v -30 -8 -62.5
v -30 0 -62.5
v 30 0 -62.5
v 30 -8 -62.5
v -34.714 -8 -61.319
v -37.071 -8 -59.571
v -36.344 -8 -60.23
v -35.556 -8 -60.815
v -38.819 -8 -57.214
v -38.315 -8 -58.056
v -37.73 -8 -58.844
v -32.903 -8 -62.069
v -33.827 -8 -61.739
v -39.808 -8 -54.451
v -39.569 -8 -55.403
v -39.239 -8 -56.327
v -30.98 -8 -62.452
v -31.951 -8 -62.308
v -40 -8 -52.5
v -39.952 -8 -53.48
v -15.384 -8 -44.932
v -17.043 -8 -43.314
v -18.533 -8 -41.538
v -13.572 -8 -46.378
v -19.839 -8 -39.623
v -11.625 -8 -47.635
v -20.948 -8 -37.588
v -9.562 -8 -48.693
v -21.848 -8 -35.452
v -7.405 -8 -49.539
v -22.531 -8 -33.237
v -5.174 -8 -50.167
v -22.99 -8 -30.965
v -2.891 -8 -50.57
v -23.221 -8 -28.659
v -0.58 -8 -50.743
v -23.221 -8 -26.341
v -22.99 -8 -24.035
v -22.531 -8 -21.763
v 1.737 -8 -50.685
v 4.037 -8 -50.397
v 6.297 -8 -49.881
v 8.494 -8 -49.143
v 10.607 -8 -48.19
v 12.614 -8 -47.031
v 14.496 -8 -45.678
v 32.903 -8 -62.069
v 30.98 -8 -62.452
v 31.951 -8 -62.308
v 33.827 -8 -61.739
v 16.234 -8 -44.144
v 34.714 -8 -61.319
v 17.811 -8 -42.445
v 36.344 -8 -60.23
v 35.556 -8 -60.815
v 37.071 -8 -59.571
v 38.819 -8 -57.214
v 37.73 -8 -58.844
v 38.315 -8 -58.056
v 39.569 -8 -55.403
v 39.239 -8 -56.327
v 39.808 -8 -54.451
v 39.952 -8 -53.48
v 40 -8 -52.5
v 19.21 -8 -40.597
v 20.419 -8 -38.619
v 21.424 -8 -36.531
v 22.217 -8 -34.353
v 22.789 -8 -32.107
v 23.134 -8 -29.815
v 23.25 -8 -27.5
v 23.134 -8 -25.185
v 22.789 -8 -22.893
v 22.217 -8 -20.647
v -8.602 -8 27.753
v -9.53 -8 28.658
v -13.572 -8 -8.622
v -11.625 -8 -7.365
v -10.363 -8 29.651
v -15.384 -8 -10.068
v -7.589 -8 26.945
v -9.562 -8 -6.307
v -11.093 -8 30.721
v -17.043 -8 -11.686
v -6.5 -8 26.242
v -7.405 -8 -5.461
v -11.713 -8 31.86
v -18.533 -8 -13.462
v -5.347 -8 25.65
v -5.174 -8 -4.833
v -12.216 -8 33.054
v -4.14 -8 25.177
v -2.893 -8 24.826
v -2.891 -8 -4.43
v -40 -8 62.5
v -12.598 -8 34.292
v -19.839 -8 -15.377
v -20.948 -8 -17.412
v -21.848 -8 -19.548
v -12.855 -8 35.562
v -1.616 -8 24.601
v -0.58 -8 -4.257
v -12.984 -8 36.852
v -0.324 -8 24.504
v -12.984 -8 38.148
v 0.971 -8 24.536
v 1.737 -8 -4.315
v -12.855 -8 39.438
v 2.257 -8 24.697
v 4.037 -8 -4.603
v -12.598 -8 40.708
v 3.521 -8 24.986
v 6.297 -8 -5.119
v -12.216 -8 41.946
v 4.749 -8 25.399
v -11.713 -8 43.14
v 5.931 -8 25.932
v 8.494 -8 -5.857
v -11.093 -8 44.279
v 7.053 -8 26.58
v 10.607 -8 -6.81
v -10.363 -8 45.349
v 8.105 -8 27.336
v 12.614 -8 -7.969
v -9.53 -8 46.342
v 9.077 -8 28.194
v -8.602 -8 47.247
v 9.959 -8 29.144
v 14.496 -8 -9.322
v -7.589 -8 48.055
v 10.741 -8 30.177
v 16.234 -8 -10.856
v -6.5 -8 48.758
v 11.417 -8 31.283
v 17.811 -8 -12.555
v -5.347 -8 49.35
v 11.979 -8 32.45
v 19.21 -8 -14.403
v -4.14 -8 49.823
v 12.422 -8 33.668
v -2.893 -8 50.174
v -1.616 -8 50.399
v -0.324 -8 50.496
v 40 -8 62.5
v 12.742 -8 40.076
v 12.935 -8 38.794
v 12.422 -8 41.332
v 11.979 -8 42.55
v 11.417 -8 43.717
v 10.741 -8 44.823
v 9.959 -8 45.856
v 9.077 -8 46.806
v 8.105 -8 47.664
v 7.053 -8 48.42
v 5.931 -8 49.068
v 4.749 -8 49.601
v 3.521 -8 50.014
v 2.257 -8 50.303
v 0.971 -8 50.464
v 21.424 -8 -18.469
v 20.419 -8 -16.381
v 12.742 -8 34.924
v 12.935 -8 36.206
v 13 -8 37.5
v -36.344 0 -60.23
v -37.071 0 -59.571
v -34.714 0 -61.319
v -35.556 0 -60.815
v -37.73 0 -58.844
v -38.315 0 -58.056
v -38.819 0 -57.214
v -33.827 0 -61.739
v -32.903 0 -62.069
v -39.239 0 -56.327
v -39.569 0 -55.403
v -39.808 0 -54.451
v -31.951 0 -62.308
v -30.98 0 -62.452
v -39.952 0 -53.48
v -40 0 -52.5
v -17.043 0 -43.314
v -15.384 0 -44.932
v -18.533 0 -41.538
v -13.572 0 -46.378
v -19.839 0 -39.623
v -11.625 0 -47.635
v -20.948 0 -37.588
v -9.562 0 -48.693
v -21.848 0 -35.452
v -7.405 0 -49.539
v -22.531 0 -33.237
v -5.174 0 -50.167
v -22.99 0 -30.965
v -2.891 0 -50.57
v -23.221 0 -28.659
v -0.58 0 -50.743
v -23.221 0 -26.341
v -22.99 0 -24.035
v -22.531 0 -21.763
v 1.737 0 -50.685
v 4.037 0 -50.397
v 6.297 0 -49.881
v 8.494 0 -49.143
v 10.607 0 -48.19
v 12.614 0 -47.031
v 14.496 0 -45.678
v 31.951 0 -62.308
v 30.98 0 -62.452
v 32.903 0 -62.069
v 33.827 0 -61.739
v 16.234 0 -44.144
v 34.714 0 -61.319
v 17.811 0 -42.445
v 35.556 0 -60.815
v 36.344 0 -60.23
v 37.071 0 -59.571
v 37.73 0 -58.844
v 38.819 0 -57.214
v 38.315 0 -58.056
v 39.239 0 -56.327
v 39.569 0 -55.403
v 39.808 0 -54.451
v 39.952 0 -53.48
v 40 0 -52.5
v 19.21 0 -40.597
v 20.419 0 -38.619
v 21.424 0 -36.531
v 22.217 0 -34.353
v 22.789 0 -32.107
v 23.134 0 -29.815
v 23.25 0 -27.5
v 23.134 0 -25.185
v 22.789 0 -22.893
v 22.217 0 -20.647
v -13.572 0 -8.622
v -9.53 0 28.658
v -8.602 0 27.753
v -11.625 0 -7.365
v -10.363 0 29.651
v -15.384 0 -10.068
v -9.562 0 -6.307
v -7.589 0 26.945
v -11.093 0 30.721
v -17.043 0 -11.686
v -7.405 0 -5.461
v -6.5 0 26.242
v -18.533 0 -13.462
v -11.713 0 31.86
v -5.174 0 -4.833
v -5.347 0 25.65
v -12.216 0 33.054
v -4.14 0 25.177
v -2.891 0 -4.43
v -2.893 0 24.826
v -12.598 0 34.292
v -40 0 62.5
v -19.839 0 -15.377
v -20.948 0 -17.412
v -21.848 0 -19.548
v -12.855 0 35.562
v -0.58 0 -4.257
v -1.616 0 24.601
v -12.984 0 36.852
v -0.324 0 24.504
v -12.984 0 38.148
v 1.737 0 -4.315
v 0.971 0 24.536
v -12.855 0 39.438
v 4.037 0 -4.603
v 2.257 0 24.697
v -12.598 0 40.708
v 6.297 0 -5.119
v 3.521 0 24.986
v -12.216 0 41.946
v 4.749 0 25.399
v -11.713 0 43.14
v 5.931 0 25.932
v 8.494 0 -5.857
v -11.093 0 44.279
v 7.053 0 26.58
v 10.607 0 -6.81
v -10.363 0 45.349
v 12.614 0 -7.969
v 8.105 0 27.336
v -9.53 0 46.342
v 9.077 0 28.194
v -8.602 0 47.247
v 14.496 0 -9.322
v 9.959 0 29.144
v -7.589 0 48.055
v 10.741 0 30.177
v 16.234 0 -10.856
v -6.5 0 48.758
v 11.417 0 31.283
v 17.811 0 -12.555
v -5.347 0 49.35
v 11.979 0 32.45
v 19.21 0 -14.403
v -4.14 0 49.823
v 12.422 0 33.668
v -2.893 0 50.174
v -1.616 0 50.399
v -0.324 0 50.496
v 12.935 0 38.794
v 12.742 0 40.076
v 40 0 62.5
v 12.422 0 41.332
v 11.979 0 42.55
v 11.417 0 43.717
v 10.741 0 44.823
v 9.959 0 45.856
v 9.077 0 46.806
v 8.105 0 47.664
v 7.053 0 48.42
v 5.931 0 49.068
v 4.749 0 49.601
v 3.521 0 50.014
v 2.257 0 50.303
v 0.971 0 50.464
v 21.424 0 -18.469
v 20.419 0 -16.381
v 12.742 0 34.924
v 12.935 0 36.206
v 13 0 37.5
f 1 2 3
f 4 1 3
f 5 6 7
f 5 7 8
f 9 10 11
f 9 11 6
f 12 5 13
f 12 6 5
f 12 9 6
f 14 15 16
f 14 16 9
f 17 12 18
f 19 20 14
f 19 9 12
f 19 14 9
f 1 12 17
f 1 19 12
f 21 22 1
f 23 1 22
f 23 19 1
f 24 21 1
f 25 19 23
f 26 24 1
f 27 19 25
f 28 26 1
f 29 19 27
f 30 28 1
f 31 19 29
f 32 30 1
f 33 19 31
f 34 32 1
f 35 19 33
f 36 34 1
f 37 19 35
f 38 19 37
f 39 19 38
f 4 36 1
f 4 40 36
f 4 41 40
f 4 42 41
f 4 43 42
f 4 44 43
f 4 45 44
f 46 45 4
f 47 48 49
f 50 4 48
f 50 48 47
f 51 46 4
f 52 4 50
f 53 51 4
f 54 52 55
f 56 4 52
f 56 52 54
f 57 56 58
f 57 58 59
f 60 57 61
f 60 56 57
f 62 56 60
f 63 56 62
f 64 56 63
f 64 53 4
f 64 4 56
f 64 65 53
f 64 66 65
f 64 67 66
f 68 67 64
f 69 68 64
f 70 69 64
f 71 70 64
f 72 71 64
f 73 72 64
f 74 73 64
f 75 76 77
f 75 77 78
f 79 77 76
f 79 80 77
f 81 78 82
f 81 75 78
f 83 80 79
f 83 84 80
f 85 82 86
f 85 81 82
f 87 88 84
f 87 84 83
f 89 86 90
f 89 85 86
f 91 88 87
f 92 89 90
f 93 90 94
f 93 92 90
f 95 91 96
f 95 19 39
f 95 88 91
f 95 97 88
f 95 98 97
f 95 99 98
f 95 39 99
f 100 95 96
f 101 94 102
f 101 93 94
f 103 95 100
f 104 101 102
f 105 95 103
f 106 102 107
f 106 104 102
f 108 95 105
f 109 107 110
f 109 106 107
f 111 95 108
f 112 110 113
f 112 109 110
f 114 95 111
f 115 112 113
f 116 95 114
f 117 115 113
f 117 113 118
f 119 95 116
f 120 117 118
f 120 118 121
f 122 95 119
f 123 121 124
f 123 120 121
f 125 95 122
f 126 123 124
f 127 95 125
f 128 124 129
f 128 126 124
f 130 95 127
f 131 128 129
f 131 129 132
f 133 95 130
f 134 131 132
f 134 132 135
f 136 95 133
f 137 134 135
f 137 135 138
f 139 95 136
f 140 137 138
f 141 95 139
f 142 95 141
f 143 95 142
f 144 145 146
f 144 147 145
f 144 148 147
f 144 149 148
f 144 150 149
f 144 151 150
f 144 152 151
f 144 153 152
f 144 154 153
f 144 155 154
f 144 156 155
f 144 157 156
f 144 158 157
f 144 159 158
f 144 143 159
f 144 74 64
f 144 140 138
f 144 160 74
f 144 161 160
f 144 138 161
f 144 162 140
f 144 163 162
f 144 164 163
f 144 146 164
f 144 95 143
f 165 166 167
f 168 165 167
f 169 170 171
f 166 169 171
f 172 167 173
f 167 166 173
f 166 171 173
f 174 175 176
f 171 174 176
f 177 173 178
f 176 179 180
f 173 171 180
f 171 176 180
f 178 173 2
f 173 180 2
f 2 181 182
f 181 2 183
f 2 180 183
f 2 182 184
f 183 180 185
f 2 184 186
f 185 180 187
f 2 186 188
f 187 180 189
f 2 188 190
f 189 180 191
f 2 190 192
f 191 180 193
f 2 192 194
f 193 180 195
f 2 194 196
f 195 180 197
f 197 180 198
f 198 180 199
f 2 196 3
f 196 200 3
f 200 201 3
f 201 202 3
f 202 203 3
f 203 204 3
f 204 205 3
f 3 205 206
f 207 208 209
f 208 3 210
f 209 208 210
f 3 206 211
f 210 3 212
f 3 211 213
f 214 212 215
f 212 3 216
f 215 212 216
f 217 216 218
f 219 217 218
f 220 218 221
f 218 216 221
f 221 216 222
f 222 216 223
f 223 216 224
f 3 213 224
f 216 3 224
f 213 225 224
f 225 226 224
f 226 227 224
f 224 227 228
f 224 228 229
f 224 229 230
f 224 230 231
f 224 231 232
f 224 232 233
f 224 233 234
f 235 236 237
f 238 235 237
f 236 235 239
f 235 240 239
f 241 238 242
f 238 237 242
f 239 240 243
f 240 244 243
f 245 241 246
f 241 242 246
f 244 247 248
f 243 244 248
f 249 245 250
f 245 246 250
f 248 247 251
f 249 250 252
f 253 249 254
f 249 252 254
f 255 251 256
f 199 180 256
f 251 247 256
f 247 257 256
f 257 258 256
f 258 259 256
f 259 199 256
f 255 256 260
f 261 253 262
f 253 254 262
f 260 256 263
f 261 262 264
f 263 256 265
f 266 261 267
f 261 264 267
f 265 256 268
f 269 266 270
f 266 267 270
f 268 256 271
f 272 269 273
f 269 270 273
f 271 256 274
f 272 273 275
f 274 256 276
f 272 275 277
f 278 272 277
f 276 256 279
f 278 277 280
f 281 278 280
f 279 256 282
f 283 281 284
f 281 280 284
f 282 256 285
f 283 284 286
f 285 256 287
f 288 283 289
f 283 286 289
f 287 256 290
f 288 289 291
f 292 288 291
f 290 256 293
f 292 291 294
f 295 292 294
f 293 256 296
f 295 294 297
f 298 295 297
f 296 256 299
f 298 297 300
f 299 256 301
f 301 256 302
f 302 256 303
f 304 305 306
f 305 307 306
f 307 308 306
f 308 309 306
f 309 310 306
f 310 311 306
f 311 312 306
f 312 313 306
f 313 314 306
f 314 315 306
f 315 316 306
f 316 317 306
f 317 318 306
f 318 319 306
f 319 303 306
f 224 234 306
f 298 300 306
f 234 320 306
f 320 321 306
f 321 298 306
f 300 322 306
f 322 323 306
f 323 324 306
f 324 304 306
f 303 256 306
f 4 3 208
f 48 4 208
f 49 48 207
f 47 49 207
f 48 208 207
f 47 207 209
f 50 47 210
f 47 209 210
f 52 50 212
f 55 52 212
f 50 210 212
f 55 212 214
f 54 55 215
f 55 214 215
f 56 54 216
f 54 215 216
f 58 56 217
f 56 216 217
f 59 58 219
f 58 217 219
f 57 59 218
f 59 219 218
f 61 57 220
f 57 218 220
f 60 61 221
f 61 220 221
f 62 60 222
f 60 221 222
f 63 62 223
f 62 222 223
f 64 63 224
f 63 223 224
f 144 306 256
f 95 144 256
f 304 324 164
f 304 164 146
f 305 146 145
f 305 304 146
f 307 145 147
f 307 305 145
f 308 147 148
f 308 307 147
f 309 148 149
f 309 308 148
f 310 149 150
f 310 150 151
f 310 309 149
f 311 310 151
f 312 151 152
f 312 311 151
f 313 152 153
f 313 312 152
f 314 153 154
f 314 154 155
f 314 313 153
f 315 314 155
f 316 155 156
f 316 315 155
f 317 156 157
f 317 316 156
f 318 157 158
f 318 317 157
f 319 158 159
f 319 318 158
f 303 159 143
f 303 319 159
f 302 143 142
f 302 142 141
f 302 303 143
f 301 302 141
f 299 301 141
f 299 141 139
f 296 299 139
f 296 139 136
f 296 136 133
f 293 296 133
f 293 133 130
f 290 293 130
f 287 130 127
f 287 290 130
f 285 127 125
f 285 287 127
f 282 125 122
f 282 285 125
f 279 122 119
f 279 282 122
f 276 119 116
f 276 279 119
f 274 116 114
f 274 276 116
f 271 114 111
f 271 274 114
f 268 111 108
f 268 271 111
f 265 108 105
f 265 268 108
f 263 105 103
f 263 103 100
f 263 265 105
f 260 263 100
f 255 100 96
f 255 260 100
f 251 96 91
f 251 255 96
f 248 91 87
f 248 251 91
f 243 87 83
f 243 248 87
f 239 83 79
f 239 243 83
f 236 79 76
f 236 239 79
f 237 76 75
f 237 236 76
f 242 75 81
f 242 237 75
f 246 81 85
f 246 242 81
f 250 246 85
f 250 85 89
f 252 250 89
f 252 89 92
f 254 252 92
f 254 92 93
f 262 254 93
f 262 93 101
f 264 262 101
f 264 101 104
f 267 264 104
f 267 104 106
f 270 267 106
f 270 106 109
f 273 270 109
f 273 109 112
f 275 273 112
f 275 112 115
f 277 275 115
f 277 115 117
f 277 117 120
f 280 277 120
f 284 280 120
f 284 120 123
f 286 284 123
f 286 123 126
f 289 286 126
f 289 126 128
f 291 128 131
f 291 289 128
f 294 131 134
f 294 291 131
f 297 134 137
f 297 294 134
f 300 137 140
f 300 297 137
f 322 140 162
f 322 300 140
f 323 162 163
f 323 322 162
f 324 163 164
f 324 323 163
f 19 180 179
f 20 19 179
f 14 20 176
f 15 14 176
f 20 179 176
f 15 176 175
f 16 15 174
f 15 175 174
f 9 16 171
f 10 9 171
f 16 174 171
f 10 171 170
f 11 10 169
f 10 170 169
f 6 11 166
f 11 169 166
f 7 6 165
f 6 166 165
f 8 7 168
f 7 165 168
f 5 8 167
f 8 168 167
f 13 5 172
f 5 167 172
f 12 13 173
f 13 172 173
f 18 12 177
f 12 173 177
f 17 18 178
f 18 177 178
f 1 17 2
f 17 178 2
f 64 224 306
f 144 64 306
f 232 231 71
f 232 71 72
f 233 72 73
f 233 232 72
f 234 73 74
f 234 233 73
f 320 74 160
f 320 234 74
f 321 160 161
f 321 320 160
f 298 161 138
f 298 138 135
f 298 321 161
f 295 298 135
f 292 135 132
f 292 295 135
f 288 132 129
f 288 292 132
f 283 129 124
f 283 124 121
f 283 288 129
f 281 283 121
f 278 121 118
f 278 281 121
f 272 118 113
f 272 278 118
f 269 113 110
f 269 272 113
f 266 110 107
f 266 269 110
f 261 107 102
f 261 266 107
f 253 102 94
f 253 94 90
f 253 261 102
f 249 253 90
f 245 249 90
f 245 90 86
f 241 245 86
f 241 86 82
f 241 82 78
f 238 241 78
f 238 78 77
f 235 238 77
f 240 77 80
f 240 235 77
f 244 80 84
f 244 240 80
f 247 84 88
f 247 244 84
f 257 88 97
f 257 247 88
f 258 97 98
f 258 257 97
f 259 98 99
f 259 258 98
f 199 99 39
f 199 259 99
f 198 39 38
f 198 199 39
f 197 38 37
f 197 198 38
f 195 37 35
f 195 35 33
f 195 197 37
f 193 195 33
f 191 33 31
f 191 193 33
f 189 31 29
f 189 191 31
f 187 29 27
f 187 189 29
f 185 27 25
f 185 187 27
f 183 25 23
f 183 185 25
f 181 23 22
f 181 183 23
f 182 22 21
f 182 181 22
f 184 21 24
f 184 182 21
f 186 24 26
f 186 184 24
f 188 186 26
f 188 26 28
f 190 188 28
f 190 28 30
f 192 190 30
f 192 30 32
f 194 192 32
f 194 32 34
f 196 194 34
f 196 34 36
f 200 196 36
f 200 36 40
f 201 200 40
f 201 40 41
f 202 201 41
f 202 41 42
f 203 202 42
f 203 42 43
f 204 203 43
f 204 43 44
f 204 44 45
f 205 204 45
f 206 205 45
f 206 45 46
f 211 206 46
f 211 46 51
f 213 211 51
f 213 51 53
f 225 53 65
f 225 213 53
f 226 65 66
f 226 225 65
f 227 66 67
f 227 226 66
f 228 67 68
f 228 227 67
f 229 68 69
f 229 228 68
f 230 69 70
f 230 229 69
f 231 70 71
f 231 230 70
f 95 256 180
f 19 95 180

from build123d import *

# Parameters (mm, degrees)
F0_R     = 23.25
F0_R_2   = 13
F1_DEPTH = 8


with BuildPart() as f1:
    # F0 (on Front) → F1 (new body)
    with BuildSketch(Plane.XZ):
        with BuildLine():
            Line((40, -52.5), (40, 62.5))
            Line((40, 62.5), (-40, 62.5))
            Line((-40, 62.5), (-40, -52.5))
            ThreePointArc((-40, -52.5), (-37.071068, -59.571068), (-30, -62.5))
            Line((-30, -62.5), (30, -62.5))
            ThreePointArc((30, -62.5), (37.071068, -59.571068), (40, -52.5))
        make_face()
        with Locations((0, -27.5)):
            Circle(F0_R, mode=Mode.SUBTRACT)
        with Locations((0, 37.5)):
            Circle(F0_R_2, mode=Mode.SUBTRACT)
    extrude(amount=F1_DEPTH)


solid = f1.part
